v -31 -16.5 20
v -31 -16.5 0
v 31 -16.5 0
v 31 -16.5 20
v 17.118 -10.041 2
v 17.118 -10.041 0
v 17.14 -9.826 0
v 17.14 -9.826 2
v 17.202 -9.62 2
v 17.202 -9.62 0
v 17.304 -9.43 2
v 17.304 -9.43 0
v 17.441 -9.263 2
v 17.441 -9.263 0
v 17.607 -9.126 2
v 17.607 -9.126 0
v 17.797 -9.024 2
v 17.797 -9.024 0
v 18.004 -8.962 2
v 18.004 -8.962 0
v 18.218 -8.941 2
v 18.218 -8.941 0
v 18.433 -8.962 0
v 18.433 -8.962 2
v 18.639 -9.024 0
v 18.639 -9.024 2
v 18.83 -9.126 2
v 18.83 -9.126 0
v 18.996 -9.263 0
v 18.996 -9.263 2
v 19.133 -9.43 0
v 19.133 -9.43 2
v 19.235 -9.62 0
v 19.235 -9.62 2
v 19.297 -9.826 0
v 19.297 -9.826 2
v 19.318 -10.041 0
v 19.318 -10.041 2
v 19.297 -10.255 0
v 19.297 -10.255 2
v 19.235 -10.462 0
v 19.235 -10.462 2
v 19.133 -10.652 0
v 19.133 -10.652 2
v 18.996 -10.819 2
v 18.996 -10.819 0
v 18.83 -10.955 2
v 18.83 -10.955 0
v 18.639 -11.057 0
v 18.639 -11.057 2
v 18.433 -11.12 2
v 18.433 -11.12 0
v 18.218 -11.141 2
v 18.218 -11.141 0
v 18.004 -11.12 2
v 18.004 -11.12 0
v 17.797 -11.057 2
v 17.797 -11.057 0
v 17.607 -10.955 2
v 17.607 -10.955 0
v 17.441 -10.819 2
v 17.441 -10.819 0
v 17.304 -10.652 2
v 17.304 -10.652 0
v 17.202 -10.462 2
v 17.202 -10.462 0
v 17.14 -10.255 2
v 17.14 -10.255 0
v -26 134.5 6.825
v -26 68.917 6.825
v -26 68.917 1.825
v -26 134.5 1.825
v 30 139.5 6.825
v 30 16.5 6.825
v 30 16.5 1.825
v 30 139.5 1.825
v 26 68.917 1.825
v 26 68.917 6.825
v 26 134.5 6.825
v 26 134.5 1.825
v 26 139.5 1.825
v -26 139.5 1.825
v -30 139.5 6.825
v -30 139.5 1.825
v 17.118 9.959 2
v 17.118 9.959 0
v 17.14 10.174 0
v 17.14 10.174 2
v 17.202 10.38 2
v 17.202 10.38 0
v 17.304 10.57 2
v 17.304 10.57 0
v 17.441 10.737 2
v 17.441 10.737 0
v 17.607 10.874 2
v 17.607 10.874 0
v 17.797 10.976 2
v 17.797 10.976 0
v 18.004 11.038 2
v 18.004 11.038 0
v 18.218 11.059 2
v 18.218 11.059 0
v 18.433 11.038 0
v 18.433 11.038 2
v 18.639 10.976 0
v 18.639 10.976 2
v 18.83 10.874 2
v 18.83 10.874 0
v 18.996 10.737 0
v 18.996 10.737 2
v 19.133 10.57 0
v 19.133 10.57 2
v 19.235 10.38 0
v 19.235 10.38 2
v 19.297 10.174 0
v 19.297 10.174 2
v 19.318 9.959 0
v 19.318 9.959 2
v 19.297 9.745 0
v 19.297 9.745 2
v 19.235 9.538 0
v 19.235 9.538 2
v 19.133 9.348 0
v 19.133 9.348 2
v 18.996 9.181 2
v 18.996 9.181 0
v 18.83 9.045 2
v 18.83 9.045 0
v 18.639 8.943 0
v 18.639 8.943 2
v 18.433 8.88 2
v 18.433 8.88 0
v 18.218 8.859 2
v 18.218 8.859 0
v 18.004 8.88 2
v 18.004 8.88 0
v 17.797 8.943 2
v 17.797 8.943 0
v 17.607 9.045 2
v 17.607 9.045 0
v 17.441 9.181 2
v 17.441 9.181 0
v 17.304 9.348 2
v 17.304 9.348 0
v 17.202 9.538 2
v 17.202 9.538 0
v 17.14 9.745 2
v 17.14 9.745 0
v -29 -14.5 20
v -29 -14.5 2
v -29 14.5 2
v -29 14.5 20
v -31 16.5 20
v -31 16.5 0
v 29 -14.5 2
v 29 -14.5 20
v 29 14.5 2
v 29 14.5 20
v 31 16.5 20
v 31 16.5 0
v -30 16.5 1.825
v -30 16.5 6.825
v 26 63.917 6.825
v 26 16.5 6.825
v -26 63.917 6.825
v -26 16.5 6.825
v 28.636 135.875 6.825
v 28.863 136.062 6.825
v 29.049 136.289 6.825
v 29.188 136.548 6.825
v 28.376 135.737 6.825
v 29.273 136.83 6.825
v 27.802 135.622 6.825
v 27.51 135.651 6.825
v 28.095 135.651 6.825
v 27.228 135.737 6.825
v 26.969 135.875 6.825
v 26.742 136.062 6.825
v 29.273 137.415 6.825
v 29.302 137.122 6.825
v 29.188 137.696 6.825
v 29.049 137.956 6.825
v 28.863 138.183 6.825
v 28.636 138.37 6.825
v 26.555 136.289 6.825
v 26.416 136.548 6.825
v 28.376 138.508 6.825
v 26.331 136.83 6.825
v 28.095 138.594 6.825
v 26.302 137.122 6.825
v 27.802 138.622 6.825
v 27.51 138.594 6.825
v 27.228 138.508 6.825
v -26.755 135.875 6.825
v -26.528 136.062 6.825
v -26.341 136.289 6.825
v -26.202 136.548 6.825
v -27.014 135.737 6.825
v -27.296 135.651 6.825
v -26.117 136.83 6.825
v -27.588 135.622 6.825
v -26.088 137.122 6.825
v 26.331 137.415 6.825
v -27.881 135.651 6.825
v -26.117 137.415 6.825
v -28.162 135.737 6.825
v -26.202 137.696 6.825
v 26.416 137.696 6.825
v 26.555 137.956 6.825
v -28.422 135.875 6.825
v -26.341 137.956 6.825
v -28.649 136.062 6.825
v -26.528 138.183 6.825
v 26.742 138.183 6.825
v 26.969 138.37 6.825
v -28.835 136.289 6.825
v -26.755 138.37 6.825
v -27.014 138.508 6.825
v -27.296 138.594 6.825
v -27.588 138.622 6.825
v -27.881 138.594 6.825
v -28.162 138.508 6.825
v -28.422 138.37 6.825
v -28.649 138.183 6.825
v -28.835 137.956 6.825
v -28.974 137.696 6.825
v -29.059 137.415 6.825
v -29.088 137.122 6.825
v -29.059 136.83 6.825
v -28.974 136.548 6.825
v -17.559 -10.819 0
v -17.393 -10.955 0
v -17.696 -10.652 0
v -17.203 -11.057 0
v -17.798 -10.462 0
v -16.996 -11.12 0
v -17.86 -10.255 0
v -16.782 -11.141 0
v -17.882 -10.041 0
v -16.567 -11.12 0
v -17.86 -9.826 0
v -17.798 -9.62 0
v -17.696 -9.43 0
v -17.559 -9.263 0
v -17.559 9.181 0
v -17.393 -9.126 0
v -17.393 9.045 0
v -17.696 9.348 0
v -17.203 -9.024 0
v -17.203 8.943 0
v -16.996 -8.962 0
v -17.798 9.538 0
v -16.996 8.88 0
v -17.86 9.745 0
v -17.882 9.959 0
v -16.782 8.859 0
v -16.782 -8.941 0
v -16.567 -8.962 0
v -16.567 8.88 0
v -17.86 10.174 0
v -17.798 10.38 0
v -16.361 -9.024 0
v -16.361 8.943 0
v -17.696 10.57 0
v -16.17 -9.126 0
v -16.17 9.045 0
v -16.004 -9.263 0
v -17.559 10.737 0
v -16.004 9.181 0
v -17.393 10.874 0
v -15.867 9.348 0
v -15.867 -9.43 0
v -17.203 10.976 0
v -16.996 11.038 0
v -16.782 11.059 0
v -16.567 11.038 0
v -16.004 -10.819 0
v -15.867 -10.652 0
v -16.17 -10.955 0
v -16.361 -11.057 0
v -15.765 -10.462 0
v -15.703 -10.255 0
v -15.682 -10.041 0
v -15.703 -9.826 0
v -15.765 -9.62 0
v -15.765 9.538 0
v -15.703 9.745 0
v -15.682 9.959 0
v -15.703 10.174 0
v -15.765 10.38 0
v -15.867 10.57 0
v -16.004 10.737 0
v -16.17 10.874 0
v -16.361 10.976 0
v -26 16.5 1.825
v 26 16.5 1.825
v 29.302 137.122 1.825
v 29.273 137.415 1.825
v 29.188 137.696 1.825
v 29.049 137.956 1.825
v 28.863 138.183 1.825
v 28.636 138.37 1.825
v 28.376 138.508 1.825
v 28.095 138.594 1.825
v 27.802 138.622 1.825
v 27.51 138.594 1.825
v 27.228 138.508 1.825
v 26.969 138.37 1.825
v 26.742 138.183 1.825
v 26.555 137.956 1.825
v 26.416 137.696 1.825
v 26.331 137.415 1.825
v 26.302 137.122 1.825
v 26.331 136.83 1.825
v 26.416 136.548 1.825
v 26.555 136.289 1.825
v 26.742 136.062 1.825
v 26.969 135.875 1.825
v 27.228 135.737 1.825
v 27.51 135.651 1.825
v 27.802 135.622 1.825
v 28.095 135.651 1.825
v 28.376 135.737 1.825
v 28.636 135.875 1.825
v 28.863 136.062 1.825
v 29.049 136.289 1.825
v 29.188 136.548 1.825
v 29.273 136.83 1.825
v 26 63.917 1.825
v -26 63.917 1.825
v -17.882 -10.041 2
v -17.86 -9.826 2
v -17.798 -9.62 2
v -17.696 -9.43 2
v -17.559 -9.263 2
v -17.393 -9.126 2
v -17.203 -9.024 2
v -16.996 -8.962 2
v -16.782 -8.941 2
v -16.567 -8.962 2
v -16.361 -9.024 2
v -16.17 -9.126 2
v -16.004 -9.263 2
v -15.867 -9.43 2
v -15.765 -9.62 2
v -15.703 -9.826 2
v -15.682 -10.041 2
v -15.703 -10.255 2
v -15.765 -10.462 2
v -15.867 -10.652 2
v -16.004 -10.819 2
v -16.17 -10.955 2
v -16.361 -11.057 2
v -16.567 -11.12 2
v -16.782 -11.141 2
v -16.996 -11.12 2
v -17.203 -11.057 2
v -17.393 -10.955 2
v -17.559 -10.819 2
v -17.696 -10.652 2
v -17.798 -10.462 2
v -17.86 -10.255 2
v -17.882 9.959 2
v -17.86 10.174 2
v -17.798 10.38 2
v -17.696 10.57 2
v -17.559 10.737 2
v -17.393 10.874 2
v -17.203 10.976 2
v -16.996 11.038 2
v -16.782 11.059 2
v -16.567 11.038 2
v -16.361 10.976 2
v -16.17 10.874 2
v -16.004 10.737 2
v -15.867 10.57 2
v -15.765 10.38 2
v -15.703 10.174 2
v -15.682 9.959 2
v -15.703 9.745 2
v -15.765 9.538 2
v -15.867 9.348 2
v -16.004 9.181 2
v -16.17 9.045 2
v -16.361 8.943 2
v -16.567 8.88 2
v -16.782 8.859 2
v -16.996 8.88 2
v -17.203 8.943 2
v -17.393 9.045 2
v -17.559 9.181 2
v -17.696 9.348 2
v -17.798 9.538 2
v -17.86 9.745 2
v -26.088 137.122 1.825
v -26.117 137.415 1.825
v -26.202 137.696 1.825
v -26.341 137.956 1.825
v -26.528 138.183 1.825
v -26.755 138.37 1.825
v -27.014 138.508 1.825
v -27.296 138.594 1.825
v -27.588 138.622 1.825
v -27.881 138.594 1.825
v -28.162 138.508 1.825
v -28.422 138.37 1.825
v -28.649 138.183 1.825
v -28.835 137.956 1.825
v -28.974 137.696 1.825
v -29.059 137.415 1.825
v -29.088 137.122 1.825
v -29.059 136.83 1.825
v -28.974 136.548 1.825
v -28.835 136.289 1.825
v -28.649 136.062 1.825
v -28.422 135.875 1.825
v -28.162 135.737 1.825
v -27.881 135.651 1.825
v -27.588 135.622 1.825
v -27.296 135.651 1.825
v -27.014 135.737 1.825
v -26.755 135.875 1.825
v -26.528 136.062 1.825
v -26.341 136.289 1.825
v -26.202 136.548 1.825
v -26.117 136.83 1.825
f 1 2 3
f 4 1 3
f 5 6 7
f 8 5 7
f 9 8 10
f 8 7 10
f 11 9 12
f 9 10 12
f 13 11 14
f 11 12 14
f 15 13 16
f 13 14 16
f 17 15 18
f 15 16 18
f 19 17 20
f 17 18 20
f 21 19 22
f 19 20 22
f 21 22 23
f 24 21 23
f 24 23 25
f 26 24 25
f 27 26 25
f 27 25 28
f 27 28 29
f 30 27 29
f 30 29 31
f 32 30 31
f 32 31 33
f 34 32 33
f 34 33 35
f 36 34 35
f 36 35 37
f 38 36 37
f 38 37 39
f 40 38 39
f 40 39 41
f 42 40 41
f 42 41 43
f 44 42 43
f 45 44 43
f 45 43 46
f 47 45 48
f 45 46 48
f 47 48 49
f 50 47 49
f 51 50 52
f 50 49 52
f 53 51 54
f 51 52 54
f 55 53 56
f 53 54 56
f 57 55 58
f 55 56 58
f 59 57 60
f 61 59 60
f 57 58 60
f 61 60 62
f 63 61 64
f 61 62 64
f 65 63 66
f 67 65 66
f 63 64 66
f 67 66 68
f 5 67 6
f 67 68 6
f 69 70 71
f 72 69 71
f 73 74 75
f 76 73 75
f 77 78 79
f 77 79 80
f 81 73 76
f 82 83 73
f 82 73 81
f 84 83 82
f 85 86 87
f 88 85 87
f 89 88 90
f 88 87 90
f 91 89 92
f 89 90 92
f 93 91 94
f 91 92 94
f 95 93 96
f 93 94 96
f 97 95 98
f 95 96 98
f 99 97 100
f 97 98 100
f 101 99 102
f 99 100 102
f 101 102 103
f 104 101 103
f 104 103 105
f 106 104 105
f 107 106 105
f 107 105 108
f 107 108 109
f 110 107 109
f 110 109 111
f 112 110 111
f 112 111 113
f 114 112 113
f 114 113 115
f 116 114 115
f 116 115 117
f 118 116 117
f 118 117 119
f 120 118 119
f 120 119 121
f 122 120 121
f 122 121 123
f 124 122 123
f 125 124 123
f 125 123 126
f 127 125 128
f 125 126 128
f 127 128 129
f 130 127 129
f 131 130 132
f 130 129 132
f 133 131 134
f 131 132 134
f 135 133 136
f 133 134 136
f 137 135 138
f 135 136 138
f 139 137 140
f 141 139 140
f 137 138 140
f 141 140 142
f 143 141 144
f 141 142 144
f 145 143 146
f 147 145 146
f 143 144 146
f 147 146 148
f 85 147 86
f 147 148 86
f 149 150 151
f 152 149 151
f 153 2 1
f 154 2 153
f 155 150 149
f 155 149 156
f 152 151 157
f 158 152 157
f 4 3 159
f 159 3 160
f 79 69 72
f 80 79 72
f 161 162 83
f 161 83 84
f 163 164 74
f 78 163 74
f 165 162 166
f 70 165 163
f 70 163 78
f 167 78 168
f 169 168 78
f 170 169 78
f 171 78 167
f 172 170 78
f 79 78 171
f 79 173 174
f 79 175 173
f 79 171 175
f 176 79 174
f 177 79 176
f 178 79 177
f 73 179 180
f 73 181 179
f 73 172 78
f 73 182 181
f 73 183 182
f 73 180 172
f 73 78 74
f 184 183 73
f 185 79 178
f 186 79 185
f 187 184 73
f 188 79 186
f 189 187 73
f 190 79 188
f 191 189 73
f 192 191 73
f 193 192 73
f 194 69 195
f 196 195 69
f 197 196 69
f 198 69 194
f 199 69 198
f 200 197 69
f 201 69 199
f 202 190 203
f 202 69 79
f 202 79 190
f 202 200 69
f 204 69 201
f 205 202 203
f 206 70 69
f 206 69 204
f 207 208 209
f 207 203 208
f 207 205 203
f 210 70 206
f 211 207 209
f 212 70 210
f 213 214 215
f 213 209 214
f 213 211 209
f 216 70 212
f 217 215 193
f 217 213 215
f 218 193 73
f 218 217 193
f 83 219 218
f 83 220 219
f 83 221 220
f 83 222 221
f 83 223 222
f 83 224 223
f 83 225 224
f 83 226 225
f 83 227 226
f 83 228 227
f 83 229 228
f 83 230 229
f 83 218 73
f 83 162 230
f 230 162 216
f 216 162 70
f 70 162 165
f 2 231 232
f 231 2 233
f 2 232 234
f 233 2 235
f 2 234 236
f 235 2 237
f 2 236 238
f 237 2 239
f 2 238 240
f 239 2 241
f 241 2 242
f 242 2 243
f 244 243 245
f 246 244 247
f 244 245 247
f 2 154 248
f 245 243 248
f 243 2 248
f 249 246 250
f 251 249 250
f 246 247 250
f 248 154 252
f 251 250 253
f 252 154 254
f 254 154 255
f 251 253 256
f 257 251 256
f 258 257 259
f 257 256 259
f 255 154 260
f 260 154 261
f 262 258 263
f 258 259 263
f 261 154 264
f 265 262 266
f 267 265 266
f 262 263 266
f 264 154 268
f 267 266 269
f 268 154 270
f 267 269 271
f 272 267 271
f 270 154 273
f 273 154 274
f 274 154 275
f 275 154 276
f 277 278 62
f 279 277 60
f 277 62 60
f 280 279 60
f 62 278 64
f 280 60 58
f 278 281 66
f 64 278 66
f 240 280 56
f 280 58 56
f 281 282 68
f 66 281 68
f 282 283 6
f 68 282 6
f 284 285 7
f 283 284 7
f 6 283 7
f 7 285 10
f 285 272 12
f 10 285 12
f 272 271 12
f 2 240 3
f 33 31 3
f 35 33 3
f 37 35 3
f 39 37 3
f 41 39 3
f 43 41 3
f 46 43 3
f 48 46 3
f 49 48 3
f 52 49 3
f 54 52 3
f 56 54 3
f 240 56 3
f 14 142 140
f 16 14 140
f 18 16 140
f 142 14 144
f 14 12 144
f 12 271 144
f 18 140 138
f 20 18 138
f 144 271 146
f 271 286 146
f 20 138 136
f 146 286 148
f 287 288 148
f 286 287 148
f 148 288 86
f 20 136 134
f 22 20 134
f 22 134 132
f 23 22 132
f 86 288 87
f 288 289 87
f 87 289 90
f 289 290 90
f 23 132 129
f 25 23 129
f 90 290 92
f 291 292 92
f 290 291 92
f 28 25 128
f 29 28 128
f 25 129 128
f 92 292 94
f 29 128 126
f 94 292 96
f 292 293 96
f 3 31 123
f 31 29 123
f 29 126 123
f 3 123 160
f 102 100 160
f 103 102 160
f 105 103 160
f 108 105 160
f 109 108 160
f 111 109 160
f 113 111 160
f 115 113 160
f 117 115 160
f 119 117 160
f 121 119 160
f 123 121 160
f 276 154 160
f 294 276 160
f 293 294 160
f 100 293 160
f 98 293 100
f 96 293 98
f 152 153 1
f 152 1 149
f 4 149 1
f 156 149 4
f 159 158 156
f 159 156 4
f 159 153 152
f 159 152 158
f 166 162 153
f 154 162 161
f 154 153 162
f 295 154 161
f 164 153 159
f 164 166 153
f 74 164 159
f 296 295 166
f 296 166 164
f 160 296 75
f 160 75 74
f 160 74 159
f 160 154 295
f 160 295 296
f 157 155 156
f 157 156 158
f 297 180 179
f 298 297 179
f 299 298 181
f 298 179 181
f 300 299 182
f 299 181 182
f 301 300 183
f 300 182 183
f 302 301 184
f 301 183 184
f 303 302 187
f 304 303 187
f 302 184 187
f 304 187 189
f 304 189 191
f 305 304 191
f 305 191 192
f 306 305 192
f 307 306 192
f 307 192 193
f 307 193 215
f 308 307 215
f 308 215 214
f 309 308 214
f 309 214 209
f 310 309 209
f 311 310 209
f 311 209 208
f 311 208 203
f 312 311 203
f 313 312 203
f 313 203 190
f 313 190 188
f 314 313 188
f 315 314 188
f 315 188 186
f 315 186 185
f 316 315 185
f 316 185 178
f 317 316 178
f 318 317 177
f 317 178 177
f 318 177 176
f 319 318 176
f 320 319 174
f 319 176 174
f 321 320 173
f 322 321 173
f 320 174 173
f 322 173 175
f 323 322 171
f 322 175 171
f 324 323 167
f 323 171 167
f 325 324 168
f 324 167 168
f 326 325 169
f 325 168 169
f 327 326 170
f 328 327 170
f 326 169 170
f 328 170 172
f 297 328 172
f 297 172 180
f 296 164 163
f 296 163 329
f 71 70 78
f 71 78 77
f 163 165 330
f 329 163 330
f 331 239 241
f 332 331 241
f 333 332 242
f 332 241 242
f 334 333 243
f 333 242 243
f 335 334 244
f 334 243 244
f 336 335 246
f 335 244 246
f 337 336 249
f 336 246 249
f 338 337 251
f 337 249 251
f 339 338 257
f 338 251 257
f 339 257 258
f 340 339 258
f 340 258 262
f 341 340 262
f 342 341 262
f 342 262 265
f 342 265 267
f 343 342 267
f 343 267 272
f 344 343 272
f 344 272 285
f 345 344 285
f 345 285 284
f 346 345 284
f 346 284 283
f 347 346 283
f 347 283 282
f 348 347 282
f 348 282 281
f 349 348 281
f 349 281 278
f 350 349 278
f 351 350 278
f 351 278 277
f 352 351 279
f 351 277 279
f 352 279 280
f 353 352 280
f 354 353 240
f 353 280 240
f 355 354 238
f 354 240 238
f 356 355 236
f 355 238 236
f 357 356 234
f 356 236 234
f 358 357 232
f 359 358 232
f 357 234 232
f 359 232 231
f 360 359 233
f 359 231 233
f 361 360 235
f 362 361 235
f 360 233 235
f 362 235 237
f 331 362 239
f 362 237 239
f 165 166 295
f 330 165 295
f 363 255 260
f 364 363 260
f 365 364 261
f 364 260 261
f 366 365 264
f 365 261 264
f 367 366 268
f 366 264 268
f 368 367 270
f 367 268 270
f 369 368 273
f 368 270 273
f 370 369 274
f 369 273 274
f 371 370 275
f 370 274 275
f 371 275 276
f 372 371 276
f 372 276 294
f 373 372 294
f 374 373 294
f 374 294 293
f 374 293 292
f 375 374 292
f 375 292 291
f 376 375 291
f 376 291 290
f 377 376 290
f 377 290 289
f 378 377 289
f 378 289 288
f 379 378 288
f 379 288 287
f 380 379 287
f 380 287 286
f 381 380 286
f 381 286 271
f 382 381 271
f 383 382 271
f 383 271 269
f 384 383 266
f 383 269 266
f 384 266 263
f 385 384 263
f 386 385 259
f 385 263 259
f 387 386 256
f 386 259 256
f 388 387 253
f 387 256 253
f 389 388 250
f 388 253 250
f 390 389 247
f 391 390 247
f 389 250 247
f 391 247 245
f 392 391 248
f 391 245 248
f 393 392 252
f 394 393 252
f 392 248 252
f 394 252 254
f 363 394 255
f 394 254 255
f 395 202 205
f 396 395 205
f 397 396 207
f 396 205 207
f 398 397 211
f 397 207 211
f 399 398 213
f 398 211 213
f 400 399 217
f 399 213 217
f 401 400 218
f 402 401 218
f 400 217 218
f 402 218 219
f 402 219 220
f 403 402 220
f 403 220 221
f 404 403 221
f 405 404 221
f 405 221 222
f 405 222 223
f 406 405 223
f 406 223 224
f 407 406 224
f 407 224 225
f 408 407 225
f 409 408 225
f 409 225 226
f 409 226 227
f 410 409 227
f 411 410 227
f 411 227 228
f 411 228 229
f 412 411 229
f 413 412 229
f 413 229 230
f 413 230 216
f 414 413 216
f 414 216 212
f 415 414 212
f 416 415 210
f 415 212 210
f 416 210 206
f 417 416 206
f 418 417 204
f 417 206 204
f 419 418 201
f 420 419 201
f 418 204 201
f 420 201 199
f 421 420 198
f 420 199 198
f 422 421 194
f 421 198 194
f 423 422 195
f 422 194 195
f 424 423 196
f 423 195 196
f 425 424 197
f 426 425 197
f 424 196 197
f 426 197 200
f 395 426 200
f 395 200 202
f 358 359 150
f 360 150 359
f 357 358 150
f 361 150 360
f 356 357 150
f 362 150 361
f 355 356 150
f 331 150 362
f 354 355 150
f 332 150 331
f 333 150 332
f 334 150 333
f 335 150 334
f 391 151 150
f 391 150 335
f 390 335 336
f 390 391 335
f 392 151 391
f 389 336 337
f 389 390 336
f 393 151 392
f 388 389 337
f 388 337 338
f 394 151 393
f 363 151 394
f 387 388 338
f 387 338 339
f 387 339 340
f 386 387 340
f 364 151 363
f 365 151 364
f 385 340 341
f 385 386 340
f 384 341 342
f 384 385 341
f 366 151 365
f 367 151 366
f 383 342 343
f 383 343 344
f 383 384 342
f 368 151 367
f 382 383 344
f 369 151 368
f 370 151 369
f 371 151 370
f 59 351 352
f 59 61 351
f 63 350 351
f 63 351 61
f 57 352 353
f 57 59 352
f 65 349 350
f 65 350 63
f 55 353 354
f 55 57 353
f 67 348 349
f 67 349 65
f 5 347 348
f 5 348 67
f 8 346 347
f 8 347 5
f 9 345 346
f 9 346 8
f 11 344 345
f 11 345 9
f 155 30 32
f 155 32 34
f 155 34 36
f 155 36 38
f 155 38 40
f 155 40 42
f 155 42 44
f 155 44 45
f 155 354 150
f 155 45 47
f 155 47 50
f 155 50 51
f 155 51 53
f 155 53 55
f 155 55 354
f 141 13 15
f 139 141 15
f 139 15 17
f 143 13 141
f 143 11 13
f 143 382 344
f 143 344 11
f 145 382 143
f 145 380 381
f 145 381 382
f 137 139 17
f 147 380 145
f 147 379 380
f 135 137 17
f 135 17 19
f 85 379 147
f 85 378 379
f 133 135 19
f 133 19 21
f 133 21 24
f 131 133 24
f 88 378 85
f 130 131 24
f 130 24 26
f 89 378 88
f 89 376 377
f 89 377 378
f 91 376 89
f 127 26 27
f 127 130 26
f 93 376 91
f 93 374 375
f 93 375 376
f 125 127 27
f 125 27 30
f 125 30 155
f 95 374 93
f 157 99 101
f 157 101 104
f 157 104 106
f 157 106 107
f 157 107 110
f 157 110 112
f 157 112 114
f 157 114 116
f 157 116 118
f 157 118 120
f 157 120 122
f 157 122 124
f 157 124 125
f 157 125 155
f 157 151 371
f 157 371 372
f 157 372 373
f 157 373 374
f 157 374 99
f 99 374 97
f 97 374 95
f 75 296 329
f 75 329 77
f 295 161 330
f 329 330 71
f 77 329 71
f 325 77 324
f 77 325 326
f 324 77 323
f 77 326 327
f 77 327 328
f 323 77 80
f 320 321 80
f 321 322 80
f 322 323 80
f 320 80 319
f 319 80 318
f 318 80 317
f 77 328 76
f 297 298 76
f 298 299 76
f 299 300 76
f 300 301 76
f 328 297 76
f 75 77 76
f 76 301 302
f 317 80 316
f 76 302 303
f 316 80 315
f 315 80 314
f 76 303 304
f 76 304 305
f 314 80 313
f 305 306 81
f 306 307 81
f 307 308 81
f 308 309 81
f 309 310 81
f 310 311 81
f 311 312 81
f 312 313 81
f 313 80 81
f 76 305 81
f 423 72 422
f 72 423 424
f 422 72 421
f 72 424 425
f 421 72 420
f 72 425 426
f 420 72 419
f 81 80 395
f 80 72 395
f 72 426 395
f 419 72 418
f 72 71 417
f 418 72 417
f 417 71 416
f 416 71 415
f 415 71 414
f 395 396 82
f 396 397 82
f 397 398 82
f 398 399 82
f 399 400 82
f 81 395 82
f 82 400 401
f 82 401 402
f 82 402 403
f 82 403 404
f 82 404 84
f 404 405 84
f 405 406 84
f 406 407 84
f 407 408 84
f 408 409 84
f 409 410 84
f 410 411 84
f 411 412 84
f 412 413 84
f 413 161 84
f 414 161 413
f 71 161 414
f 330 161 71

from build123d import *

# Parameters (mm, degrees)
SKETCH1_W           = 62
SKETCH1_H           = 33
BOSS_EXTRUDE1_DEPTH = 20
SHELL1_T            = -2
SKETCH2_W           = 4
SKETCH2_H           = 5
BOSS_EXTRUDE2_DEPTH = 123
SKETCH3_W           = 5
SKETCH3_H           = 5
BOSS_EXTRUDE3_DEPTH = 53
SKETCH4_W           = 5
SKETCH4_H           = 4.999777887
BOSS_EXTRUDE4_DEPTH = 53
SKETCH5_R           = 1.5
CUT_EXTRUDE1_DEPTH  = 53
SKETCH6_R           = 1.1
CUT_EXTRUDE2_DEPTH  = 10


with BuildPart() as part:
    # Sketch1 → Boss-Extrude1 (new body)
    with BuildSketch(Plane.XY):
        Rectangle(SKETCH1_W, SKETCH1_H)
    extrude(amount=BOSS_EXTRUDE1_DEPTH)

    # Shell1
    shell1_openings = [part.faces().sort_by_distance(p)[0] for p in [
        (0, 0, 20),
    ]]
    offset(amount=SHELL1_T, openings=shell1_openings, kind=Kind.INTERSECTION)

    # Sketch2 → Boss-Extrude2 (add)
    with BuildSketch(Plane(origin=(0, 16.5, 0), x_dir=(1, 0, 0), z_dir=(0, 1, 0))):
        with Locations((-28, -4.324522586)):
            Rectangle(SKETCH2_W, SKETCH2_H)
        with Locations((28, -4.324522586)):
            Rectangle(SKETCH2_W, SKETCH2_H)
    extrude(amount=BOSS_EXTRUDE2_DEPTH)

    # Sketch3 → Boss-Extrude3 (add)
    with BuildSketch(Plane(origin=(-26, 0, 0), x_dir=(0, 0, -1), z_dir=(1, 0, 0))):
        with Locations((-4.324522586, 66.417337004)):
            Rectangle(SKETCH3_W, SKETCH3_H)
    extrude(amount=BOSS_EXTRUDE3_DEPTH)

    # Sketch4 → Boss-Extrude4 (add)
    with BuildSketch(Plane(origin=(-26, 0, 0), x_dir=(0, 0, -1), z_dir=(1, 0, 0))):
        with Locations((-4.324522586, 137.000111057)):
            Rectangle(SKETCH4_W, SKETCH4_H)
    extrude(amount=BOSS_EXTRUDE4_DEPTH)

    # Sketch5 → Cut-Extrude1 (cut)
    with BuildSketch(Plane.XY.offset(6.824522586)):
        with Locations((-27.588179803, 137.122373113)):
            Circle(SKETCH5_R)
        with Locations((27.802254523, 137.122373113)):
            Circle(SKETCH5_R)
    extrude(amount=-CUT_EXTRUDE1_DEPTH, mode=Mode.SUBTRACT)

    # Sketch6 → Cut-Extrude2 (cut)
    with BuildSketch(Plane(origin=(0, 0, 0), x_dir=(-1, 0, 0), z_dir=(0, 0, -1))):
        with Locations((-18.21842794, 9.95930811)):
            Circle(SKETCH6_R)
        with Locations((-18.21842794, -10.04069189)):
            Circle(SKETCH6_R)
        with Locations((16.78157206, -10.04069189)):
            Circle(SKETCH6_R)
        with Locations((16.78157206, 9.95930811)):
            Circle(SKETCH6_R)
    extrude(amount=-CUT_EXTRUDE2_DEPTH, mode=Mode.SUBTRACT)


solid = part.part
